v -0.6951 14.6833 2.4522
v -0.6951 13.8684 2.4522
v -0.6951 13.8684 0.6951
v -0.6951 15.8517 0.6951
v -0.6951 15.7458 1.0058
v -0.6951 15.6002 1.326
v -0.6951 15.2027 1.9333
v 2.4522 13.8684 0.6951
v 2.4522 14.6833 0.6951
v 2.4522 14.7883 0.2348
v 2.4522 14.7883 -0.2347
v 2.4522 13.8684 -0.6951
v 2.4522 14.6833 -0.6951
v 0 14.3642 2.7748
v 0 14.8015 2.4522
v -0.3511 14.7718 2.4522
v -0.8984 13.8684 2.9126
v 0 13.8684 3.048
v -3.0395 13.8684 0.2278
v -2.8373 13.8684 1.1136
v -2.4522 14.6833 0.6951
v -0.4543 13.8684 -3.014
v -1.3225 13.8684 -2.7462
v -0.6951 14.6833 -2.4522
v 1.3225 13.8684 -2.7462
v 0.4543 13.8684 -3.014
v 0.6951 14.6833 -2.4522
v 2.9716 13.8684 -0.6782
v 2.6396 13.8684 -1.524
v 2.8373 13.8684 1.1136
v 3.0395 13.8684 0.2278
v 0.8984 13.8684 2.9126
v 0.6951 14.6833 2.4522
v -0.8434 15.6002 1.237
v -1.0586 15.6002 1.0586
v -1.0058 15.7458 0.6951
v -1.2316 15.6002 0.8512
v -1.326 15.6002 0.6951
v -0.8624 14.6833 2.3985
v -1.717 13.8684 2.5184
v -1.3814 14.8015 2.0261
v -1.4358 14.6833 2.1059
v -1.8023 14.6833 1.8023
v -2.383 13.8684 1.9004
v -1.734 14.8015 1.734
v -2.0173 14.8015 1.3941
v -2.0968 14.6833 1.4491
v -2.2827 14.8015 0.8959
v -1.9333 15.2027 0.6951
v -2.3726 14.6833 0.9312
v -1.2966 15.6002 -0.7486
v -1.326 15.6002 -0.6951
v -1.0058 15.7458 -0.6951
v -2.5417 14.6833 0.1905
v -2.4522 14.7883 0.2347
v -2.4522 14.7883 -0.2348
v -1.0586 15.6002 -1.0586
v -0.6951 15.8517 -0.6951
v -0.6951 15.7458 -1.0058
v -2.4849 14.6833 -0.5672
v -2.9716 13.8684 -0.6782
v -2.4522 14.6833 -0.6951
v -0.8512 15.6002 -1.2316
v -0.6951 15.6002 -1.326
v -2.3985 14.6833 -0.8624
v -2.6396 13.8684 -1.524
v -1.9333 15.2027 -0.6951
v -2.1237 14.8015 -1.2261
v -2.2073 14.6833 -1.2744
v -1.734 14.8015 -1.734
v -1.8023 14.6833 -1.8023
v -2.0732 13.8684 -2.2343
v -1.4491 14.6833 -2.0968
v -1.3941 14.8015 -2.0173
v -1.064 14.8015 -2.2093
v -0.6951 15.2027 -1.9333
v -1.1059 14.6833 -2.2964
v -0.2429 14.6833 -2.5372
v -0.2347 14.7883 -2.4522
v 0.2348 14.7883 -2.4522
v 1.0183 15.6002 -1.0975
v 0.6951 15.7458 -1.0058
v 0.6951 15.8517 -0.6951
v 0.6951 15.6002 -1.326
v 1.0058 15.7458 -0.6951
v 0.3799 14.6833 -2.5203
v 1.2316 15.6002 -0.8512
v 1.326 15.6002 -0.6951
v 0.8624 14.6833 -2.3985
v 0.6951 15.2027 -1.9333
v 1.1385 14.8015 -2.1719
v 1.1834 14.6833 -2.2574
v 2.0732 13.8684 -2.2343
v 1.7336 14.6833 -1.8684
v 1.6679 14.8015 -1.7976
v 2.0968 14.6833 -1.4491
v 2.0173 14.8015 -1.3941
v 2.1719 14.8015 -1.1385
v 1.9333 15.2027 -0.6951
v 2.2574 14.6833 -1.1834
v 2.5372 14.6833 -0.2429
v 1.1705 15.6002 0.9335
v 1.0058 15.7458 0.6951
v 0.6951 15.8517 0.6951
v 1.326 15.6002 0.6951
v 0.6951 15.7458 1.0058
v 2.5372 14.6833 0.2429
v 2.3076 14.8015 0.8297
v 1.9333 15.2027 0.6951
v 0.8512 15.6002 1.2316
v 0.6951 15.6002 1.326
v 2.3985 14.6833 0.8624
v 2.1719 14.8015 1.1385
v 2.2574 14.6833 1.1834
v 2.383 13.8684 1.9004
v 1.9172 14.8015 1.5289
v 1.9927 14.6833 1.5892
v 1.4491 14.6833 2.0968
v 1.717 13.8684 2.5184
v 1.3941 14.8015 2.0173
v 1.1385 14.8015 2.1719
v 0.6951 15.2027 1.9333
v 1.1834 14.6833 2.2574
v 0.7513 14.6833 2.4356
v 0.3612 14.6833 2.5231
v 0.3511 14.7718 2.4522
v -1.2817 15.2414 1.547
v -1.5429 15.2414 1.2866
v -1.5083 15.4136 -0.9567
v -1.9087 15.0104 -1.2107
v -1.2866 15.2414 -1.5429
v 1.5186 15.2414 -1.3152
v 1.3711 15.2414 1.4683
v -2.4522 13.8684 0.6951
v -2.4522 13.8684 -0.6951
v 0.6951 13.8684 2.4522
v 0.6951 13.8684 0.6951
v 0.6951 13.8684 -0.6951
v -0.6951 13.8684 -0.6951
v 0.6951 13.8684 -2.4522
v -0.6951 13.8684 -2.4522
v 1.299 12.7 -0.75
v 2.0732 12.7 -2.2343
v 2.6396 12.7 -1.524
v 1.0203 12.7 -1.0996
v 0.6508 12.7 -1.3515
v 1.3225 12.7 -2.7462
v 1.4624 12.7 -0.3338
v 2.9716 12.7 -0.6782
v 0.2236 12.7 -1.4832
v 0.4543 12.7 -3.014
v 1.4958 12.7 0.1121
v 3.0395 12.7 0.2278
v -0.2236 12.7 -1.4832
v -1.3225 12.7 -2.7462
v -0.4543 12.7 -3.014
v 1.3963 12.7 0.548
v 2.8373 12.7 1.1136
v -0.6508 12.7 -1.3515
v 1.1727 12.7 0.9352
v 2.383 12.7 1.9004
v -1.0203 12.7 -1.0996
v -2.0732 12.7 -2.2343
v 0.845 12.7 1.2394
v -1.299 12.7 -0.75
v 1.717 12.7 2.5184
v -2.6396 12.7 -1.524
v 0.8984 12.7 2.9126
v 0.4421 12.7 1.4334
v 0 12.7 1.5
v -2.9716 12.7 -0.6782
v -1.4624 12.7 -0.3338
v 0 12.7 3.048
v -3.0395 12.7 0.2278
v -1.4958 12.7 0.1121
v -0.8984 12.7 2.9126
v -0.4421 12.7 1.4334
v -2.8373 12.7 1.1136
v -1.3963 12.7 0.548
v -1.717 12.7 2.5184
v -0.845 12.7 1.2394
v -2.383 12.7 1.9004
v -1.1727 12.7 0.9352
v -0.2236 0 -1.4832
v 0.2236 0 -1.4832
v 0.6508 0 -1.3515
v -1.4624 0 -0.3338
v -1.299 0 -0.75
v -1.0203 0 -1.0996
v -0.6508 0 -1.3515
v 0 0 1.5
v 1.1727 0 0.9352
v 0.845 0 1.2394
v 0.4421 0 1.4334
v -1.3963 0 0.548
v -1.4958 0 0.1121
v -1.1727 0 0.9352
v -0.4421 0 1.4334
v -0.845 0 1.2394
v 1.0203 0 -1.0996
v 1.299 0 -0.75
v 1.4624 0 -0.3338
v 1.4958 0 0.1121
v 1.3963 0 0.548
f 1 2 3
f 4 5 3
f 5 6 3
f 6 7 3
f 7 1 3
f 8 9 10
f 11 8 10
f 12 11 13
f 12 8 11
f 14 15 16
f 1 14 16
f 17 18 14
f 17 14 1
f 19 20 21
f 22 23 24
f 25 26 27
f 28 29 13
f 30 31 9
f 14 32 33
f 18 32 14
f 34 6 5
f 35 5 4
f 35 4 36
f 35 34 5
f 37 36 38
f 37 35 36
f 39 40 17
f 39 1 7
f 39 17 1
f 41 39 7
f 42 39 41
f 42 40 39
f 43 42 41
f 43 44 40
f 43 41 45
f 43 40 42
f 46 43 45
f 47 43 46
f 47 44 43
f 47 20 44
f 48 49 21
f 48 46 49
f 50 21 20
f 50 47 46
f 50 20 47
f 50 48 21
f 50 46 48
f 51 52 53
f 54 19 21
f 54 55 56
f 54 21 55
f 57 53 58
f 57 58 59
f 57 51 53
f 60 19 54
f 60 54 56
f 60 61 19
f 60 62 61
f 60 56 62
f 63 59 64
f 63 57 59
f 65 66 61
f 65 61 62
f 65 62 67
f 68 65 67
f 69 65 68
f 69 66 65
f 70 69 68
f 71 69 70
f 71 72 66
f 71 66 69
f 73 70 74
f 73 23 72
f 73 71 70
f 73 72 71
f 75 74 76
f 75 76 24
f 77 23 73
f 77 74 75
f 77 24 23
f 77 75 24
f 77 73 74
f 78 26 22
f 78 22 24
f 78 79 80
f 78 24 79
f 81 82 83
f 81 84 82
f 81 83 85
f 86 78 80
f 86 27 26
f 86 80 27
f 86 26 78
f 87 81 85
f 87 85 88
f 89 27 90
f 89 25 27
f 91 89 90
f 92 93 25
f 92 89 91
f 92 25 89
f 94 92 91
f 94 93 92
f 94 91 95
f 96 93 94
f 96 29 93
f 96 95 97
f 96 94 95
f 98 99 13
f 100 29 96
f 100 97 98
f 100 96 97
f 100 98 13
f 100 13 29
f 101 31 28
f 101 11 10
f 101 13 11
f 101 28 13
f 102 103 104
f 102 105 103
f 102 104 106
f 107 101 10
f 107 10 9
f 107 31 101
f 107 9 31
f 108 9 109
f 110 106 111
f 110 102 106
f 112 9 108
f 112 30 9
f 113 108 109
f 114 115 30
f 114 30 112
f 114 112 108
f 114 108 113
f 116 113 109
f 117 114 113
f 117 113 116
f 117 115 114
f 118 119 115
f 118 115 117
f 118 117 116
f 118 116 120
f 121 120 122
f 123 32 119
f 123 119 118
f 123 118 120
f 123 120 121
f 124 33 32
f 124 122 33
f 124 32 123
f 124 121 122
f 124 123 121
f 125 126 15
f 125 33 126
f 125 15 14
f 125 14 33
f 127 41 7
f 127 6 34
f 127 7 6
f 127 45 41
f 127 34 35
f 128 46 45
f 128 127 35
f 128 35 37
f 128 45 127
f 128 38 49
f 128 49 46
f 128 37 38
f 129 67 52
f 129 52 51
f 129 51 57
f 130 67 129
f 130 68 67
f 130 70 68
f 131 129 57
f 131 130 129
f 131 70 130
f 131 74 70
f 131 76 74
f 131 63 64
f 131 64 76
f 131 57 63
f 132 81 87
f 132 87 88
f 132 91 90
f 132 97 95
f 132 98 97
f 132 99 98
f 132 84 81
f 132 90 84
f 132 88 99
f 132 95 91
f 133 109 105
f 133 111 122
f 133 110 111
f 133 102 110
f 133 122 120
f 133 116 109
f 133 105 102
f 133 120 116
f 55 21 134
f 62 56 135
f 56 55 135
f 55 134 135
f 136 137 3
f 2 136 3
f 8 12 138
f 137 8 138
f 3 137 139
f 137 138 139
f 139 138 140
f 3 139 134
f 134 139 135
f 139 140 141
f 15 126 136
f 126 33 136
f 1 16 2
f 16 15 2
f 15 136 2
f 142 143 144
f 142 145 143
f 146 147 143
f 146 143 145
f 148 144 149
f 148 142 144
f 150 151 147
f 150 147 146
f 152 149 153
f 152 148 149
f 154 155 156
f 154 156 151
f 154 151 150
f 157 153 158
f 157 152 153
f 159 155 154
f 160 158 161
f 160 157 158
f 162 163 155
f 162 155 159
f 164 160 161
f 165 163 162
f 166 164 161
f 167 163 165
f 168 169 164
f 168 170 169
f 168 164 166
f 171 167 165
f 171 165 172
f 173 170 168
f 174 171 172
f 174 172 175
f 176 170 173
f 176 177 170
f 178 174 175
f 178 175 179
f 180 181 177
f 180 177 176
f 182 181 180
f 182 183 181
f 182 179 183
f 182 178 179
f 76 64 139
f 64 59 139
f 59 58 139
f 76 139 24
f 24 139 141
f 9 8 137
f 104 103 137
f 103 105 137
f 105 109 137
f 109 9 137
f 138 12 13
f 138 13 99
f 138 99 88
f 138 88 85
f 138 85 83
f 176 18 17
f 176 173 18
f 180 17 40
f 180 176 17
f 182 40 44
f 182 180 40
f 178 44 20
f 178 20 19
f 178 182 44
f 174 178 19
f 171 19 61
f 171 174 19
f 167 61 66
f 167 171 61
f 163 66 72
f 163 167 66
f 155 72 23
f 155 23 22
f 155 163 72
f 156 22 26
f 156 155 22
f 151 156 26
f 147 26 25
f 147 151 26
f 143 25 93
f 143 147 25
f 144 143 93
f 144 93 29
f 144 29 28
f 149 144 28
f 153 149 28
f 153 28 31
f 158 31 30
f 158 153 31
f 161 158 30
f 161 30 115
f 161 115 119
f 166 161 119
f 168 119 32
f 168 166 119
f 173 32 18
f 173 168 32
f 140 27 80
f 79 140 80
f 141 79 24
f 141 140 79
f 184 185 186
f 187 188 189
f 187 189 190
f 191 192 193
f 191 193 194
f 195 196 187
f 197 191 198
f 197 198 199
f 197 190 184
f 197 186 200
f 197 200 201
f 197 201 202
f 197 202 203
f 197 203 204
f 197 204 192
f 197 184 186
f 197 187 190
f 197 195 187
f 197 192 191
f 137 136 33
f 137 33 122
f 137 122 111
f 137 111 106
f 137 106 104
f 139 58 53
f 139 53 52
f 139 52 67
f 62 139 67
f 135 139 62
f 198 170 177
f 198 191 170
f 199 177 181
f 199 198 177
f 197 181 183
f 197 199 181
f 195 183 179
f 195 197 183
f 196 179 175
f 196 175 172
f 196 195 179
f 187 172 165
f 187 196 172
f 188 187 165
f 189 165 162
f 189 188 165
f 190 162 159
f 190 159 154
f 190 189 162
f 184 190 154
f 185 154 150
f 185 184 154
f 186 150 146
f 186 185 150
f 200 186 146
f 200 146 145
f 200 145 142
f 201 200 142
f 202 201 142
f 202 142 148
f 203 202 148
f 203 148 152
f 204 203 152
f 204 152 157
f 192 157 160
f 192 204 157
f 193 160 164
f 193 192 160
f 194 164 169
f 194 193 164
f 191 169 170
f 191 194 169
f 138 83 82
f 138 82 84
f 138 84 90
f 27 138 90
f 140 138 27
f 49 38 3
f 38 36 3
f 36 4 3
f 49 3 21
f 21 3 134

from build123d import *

# Parameters (mm, degrees)
CUT_EXTRUDE1_REACH = 16.523
SKETCH2_W          = 4.904374576
SKETCH2_H          = 1.390216618
SKETCH2_W_2        = 1.390216618
SKETCH2_H_2        = 4.904374576


with BuildPart() as part:
    # Sketch1 → Revolve1 (revolve)
    with BuildSketch(Plane.XY, mode=Mode.PRIVATE) as revolve1_sk:
        with BuildLine():
            Line((0, 0), (0, 12.7))
            Line((0, 12.7), (0, 13.8684))
            Line((0, 13.8684), (0, 16.128443135))
            add(Edge.make_bspline(
                [(0, 16.128443135), (2.158115005, 15.748885895), (3.048, 13.8684)],
                knots=[0, 0, 0, 1, 1, 1], degree=2))
            Line((3.048, 13.8684), (3.048, 12.7))
            Line((3.048, 12.7), (1.5, 12.7))
            Line((1.5, 12.7), (1.5, 0))
            Line((1.5, 0), (0, 0))
        make_face()
    revolve(revolve1_sk.sketch.rotate(Axis((0, 18.881175956, 0), (0, -1, 0)), 90), axis=Axis((0, 18.881175956, 0), (0, -1, 0)))

    # Sketch2 → Cut-Extrude1 (cut, up to next)
    with BuildSketch(Plane(origin=(0, 13.8684, 0), x_dir=(-1, 0, 0), z_dir=(0, -1, 0)), mode=Mode.PRIVATE) as cut_extrude1_sk1:
        Rectangle(SKETCH2_W, SKETCH2_H)
    cut_extrude1_tool1 = extrude(cut_extrude1_sk1.sketch, amount=-CUT_EXTRUDE1_REACH, mode=Mode.PRIVATE) & part.part
    # Sketch2 → Cut-Extrude1 (cut, up to next)
    with BuildSketch(Plane(origin=(0, 13.8684, 0), x_dir=(-1, 0, 0), z_dir=(0, -1, 0)), mode=Mode.PRIVATE) as cut_extrude1_sk2:
        Rectangle(SKETCH2_W_2, SKETCH2_H_2)
    cut_extrude1_tool2 = extrude(cut_extrude1_sk2.sketch, amount=-CUT_EXTRUDE1_REACH, mode=Mode.PRIVATE) & part.part
    add(cut_extrude1_tool1.solids().sort_by_distance((0, 13.8684, 0))[0], mode=Mode.SUBTRACT)
    add(cut_extrude1_tool2.solids().sort_by_distance((0, 13.8684, 0))[0], mode=Mode.SUBTRACT)


solid = part.part
